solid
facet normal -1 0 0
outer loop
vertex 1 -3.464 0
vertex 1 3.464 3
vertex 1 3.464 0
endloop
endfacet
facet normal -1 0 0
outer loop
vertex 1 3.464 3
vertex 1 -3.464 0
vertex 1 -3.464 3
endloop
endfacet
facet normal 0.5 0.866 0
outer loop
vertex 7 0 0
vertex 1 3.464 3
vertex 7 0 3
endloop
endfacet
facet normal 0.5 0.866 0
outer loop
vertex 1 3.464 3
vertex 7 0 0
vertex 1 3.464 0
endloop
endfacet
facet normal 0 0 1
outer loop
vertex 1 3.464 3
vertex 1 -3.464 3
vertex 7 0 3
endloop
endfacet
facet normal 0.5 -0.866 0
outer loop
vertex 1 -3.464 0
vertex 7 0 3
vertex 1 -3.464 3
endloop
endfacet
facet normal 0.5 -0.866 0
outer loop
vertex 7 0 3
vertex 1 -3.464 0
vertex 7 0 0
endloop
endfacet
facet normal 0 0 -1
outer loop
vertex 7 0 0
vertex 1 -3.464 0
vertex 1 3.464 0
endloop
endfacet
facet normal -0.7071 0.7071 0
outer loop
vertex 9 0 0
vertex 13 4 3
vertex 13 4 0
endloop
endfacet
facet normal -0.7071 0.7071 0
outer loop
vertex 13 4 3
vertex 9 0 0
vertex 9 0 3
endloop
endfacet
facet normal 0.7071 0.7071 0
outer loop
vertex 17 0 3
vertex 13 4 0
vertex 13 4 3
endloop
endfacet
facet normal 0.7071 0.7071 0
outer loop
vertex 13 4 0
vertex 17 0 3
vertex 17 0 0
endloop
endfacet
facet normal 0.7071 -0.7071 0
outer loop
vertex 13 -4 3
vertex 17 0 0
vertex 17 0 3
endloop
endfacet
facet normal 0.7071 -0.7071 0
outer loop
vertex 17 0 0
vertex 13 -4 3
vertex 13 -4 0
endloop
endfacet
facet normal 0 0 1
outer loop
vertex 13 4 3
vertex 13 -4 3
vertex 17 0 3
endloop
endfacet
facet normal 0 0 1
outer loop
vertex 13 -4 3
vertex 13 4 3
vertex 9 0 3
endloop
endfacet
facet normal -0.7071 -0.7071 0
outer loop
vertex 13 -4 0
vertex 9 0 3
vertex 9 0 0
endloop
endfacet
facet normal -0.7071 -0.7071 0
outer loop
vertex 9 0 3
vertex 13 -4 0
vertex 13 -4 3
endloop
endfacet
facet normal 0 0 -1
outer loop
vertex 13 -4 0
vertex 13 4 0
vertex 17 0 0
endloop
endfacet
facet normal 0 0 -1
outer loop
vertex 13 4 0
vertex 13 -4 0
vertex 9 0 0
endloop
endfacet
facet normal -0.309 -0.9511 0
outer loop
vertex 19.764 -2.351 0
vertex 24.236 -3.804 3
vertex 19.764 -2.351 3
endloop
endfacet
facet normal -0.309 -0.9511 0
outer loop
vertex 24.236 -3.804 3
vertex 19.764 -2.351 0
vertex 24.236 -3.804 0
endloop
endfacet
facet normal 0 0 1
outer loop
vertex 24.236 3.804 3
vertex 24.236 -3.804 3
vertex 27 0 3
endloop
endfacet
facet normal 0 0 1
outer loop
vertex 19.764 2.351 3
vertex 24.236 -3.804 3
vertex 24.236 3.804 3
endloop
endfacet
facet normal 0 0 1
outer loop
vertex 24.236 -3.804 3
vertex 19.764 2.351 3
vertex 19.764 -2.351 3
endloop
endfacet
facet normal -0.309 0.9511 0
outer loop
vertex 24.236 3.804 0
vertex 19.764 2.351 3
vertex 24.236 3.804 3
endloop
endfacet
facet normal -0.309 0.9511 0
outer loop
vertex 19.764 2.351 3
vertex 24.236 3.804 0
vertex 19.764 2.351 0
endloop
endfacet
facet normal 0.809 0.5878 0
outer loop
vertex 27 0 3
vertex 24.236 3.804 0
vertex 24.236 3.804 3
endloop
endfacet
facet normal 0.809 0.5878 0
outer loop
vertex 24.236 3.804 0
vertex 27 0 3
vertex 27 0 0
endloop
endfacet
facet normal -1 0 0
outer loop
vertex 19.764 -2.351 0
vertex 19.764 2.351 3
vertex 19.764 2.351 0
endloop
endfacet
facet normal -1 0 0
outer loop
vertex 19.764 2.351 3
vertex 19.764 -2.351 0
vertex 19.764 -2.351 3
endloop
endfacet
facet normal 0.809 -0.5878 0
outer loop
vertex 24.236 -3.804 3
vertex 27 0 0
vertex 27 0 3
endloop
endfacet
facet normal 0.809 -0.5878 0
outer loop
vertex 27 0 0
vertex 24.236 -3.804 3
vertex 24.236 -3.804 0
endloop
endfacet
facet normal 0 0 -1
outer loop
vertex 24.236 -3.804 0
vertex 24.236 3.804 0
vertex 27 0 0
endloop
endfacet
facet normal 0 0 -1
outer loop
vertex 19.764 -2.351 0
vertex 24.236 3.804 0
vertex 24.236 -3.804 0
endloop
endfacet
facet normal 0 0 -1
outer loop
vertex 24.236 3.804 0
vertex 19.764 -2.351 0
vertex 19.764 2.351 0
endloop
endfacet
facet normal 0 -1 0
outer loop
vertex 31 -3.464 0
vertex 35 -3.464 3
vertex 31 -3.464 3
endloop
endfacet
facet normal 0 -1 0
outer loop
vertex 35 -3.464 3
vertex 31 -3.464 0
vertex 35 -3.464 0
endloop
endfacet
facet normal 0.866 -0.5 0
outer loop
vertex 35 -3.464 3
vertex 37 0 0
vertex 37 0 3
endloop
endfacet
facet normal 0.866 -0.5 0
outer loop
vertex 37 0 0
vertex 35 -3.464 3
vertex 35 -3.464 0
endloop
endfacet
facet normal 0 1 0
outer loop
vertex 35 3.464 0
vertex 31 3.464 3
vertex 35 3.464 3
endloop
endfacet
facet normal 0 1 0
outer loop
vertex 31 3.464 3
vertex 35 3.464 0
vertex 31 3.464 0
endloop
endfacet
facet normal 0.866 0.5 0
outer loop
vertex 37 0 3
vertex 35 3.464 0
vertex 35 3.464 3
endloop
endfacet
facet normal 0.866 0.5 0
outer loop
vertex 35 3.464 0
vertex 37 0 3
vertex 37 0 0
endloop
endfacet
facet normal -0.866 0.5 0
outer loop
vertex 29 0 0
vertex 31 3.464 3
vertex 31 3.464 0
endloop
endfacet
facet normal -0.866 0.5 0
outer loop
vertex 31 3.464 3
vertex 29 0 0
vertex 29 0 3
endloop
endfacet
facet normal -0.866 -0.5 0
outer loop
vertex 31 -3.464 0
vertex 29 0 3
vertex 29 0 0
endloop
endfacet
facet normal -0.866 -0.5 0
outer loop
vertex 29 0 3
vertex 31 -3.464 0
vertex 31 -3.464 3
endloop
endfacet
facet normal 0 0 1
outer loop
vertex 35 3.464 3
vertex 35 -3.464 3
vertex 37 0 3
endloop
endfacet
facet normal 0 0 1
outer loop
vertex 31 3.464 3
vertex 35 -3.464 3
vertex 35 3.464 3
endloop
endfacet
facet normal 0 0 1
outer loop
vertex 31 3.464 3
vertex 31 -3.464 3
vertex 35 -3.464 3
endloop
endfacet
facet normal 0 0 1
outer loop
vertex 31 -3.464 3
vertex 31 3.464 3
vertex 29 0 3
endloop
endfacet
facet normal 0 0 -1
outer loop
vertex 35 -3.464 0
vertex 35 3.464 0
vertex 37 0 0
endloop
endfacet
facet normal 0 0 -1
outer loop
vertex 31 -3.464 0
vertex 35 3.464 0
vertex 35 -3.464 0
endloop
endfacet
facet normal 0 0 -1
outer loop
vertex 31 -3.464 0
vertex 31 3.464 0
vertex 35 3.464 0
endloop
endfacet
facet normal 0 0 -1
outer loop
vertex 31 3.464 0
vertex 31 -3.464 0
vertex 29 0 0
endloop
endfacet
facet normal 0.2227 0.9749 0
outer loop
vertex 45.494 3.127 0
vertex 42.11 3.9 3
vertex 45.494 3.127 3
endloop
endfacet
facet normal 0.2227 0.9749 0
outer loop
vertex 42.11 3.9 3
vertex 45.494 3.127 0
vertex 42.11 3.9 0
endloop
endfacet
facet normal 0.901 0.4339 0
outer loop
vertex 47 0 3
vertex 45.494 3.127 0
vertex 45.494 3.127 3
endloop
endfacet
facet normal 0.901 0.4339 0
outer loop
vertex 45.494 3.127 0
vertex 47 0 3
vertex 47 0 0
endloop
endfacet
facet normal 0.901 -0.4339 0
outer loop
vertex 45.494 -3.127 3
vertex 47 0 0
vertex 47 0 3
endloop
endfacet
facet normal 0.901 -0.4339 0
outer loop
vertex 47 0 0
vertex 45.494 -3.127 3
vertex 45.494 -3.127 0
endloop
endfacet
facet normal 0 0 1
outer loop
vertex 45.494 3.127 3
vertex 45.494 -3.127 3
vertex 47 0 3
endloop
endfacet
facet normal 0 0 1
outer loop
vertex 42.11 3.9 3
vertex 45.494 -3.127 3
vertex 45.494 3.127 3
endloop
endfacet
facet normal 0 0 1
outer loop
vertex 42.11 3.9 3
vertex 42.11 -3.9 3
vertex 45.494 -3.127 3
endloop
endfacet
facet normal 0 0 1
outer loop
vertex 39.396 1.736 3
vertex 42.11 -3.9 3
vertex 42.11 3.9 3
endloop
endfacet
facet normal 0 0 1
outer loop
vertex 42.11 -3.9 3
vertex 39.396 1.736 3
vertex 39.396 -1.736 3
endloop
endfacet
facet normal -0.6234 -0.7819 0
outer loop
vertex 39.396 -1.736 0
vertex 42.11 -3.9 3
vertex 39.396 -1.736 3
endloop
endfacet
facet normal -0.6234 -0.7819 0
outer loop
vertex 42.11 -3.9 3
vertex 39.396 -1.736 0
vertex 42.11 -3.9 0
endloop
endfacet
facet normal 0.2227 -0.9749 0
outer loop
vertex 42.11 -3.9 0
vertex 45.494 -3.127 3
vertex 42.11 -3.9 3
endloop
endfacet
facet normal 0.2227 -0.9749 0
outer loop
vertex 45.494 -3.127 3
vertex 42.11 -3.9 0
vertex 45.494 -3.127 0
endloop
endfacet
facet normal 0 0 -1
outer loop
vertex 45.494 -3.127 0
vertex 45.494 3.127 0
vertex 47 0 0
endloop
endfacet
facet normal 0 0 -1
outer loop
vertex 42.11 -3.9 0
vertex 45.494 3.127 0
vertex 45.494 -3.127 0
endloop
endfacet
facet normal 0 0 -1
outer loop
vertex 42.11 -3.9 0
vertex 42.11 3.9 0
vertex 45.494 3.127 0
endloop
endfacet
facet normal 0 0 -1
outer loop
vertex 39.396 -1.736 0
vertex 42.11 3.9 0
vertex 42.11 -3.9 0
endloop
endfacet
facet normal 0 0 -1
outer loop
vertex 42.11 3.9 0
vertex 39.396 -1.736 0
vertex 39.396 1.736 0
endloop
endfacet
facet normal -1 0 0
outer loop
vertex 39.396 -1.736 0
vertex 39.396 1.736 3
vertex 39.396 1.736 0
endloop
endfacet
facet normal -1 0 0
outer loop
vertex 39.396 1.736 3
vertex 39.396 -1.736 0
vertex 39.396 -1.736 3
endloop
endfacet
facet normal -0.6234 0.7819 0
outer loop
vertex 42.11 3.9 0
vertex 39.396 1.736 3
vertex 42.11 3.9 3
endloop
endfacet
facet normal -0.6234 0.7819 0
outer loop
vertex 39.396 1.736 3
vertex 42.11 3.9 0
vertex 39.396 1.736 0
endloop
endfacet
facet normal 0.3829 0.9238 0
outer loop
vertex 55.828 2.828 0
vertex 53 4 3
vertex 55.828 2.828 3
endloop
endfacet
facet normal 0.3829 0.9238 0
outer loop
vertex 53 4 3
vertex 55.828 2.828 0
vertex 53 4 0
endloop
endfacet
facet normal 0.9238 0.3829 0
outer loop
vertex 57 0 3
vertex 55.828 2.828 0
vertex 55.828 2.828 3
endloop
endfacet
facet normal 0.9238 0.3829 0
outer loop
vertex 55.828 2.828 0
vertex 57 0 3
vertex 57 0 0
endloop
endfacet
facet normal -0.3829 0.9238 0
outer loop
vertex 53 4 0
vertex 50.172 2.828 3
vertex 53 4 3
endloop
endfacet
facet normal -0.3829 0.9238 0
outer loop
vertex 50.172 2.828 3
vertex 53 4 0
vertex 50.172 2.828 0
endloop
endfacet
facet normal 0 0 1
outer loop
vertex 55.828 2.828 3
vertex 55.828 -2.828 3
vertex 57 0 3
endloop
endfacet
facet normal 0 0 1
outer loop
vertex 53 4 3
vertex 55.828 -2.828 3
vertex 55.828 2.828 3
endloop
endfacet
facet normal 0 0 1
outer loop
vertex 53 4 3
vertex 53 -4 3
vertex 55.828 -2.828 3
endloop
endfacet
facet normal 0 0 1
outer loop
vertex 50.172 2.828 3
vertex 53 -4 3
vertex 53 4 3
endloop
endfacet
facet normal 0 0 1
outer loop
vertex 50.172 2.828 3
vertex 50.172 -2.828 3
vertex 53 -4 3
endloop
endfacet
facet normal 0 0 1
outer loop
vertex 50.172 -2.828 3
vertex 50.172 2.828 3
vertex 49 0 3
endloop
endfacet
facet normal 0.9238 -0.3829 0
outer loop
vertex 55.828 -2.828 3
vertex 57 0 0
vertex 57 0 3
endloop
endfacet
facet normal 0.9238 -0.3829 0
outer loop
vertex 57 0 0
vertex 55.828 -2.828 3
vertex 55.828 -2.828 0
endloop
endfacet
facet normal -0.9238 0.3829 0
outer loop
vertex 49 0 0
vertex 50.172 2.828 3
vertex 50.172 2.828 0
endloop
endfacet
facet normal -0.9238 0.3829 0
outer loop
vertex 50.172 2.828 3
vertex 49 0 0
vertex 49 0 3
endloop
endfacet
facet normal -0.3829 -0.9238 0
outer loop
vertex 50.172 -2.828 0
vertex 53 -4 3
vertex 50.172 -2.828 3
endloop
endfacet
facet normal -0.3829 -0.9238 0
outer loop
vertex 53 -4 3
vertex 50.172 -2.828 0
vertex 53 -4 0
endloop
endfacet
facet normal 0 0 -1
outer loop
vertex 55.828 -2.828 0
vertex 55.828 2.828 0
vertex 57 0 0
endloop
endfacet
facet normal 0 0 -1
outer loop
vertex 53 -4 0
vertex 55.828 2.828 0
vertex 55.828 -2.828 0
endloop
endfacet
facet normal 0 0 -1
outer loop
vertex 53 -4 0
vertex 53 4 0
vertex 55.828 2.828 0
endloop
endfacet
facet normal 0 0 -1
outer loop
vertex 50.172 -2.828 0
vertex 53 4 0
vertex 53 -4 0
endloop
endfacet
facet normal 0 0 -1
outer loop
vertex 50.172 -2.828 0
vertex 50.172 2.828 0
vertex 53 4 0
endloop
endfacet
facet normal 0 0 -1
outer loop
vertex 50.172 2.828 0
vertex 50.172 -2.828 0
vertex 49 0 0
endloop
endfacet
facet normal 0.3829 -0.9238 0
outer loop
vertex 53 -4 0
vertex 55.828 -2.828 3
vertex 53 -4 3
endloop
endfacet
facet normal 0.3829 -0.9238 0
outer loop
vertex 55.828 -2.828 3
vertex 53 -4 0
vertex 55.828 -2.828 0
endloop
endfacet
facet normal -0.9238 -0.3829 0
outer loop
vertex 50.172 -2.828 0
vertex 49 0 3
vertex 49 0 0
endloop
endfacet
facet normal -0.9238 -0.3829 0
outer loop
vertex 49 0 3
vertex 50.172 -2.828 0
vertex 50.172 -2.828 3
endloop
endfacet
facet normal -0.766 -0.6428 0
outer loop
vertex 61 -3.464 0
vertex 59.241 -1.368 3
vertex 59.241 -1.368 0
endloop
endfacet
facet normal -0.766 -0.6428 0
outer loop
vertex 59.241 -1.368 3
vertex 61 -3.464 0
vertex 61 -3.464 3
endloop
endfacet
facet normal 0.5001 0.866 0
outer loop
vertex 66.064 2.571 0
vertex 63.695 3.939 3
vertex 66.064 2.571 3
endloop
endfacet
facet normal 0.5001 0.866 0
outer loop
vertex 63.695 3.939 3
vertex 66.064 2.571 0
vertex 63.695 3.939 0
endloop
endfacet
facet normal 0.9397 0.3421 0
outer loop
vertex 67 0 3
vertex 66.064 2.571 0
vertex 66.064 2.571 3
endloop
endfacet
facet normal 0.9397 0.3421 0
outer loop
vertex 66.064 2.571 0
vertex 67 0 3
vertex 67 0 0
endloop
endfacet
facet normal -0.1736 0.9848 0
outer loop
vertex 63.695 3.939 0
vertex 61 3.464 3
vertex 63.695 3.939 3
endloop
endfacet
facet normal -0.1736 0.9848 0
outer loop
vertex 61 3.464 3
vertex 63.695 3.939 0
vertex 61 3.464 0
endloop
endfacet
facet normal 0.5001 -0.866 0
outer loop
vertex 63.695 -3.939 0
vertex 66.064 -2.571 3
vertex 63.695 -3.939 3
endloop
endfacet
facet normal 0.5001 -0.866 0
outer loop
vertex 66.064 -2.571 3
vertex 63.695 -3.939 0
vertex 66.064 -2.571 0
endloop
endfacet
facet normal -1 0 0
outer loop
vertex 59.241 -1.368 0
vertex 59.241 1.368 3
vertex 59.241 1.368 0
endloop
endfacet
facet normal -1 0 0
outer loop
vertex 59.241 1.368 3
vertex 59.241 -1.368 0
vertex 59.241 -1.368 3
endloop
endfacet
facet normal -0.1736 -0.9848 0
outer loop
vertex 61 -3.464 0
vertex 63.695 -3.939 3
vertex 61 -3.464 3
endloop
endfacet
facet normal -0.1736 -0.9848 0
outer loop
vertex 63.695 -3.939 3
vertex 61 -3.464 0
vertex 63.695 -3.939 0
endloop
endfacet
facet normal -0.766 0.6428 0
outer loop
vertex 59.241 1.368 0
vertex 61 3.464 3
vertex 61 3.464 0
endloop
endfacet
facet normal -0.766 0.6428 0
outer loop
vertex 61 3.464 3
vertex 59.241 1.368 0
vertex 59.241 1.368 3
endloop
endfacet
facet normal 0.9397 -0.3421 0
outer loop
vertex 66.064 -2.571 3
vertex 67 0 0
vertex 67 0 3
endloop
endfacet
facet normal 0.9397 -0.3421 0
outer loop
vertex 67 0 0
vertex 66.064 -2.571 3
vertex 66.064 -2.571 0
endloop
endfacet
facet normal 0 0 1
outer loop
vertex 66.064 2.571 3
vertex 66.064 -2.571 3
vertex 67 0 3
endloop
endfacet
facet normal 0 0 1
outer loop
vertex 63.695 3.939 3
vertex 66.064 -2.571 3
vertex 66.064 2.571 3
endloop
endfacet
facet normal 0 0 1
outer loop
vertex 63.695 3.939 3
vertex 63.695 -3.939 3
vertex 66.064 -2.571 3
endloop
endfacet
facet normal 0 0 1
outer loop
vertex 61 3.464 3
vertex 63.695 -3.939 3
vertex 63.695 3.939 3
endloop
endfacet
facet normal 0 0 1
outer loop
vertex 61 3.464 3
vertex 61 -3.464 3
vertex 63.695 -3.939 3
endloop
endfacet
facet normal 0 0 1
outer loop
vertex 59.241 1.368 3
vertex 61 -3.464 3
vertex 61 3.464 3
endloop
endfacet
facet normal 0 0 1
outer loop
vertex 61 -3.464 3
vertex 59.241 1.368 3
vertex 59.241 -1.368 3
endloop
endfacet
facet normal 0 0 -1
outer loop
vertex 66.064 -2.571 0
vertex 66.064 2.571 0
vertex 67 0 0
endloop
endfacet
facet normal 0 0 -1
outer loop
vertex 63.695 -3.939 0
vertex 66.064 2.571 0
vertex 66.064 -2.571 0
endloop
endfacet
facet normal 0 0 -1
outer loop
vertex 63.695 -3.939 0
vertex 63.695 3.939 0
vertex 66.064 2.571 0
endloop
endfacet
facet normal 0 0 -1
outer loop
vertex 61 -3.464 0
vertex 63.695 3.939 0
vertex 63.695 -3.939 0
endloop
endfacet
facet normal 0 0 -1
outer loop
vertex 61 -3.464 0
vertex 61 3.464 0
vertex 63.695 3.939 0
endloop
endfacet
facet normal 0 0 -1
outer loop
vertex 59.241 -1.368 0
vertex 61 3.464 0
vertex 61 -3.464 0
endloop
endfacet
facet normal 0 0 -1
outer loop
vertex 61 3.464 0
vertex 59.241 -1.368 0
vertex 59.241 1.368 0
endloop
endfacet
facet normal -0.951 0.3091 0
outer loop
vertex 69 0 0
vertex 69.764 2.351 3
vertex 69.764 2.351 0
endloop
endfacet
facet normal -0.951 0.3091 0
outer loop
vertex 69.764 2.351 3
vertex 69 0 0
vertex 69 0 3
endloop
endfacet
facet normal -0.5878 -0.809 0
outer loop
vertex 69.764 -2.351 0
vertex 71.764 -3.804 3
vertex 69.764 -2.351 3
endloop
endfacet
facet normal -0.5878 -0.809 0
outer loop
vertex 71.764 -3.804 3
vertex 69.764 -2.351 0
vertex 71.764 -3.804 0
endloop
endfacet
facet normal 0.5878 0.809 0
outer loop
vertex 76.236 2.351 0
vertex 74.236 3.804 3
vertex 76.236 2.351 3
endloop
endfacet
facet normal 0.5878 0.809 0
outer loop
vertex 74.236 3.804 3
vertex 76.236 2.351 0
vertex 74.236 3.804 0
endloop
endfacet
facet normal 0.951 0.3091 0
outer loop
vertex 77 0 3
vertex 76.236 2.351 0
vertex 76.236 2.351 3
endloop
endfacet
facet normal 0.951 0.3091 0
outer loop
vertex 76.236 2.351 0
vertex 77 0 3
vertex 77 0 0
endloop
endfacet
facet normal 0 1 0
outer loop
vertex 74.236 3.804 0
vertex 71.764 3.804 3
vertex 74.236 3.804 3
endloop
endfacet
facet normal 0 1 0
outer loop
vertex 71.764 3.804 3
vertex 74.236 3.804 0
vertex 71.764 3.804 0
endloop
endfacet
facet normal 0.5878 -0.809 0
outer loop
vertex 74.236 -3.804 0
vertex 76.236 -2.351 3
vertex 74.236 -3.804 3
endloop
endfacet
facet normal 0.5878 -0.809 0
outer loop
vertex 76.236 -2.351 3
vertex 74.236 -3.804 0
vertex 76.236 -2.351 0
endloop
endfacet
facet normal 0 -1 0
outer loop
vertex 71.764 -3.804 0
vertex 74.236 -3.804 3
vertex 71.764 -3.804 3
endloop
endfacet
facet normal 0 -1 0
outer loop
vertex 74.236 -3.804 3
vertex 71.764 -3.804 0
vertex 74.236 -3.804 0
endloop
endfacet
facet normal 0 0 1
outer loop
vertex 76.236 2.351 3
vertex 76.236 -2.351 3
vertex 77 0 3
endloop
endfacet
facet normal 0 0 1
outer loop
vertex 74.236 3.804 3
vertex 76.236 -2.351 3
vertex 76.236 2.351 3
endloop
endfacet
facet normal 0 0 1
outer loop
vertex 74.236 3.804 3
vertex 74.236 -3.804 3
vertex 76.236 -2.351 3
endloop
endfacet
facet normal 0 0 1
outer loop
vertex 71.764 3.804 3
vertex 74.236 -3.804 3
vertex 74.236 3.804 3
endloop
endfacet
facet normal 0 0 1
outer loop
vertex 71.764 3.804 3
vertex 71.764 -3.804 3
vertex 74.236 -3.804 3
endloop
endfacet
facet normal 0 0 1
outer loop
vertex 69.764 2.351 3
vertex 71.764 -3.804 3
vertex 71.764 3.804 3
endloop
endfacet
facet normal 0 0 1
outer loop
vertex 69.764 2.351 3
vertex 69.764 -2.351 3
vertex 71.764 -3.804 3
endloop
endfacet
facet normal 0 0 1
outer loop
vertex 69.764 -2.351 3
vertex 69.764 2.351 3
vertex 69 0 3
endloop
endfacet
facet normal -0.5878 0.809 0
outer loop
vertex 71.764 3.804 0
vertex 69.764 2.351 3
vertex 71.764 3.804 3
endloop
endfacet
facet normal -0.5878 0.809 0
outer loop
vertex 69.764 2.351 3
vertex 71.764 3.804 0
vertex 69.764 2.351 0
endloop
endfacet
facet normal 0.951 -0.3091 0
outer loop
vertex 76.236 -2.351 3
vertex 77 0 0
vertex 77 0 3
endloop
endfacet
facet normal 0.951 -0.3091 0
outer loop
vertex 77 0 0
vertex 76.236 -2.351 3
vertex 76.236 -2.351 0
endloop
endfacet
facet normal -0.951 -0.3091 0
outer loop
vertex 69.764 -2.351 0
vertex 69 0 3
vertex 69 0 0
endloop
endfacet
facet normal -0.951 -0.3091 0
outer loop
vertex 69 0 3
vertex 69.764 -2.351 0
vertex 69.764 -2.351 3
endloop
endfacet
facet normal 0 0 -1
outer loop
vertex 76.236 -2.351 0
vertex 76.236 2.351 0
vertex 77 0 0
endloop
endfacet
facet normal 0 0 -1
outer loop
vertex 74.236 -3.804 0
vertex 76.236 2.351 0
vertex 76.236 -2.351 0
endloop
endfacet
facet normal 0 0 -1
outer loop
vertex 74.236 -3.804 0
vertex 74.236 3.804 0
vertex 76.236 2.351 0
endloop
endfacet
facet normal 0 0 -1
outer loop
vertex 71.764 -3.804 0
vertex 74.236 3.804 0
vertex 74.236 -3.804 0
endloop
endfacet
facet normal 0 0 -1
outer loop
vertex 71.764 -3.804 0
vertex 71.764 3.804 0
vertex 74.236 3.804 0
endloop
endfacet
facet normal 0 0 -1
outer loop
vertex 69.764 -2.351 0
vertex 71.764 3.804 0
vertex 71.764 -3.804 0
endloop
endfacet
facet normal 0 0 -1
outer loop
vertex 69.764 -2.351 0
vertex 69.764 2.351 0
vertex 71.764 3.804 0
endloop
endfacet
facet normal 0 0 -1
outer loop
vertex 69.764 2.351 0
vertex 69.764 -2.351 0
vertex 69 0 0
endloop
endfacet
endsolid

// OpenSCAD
for (s=[3:10]) {
  translate([(s-3)*10+3, 0, 0]) {
    cylinder(r=4, h=3, $fn=s);
  }
}
